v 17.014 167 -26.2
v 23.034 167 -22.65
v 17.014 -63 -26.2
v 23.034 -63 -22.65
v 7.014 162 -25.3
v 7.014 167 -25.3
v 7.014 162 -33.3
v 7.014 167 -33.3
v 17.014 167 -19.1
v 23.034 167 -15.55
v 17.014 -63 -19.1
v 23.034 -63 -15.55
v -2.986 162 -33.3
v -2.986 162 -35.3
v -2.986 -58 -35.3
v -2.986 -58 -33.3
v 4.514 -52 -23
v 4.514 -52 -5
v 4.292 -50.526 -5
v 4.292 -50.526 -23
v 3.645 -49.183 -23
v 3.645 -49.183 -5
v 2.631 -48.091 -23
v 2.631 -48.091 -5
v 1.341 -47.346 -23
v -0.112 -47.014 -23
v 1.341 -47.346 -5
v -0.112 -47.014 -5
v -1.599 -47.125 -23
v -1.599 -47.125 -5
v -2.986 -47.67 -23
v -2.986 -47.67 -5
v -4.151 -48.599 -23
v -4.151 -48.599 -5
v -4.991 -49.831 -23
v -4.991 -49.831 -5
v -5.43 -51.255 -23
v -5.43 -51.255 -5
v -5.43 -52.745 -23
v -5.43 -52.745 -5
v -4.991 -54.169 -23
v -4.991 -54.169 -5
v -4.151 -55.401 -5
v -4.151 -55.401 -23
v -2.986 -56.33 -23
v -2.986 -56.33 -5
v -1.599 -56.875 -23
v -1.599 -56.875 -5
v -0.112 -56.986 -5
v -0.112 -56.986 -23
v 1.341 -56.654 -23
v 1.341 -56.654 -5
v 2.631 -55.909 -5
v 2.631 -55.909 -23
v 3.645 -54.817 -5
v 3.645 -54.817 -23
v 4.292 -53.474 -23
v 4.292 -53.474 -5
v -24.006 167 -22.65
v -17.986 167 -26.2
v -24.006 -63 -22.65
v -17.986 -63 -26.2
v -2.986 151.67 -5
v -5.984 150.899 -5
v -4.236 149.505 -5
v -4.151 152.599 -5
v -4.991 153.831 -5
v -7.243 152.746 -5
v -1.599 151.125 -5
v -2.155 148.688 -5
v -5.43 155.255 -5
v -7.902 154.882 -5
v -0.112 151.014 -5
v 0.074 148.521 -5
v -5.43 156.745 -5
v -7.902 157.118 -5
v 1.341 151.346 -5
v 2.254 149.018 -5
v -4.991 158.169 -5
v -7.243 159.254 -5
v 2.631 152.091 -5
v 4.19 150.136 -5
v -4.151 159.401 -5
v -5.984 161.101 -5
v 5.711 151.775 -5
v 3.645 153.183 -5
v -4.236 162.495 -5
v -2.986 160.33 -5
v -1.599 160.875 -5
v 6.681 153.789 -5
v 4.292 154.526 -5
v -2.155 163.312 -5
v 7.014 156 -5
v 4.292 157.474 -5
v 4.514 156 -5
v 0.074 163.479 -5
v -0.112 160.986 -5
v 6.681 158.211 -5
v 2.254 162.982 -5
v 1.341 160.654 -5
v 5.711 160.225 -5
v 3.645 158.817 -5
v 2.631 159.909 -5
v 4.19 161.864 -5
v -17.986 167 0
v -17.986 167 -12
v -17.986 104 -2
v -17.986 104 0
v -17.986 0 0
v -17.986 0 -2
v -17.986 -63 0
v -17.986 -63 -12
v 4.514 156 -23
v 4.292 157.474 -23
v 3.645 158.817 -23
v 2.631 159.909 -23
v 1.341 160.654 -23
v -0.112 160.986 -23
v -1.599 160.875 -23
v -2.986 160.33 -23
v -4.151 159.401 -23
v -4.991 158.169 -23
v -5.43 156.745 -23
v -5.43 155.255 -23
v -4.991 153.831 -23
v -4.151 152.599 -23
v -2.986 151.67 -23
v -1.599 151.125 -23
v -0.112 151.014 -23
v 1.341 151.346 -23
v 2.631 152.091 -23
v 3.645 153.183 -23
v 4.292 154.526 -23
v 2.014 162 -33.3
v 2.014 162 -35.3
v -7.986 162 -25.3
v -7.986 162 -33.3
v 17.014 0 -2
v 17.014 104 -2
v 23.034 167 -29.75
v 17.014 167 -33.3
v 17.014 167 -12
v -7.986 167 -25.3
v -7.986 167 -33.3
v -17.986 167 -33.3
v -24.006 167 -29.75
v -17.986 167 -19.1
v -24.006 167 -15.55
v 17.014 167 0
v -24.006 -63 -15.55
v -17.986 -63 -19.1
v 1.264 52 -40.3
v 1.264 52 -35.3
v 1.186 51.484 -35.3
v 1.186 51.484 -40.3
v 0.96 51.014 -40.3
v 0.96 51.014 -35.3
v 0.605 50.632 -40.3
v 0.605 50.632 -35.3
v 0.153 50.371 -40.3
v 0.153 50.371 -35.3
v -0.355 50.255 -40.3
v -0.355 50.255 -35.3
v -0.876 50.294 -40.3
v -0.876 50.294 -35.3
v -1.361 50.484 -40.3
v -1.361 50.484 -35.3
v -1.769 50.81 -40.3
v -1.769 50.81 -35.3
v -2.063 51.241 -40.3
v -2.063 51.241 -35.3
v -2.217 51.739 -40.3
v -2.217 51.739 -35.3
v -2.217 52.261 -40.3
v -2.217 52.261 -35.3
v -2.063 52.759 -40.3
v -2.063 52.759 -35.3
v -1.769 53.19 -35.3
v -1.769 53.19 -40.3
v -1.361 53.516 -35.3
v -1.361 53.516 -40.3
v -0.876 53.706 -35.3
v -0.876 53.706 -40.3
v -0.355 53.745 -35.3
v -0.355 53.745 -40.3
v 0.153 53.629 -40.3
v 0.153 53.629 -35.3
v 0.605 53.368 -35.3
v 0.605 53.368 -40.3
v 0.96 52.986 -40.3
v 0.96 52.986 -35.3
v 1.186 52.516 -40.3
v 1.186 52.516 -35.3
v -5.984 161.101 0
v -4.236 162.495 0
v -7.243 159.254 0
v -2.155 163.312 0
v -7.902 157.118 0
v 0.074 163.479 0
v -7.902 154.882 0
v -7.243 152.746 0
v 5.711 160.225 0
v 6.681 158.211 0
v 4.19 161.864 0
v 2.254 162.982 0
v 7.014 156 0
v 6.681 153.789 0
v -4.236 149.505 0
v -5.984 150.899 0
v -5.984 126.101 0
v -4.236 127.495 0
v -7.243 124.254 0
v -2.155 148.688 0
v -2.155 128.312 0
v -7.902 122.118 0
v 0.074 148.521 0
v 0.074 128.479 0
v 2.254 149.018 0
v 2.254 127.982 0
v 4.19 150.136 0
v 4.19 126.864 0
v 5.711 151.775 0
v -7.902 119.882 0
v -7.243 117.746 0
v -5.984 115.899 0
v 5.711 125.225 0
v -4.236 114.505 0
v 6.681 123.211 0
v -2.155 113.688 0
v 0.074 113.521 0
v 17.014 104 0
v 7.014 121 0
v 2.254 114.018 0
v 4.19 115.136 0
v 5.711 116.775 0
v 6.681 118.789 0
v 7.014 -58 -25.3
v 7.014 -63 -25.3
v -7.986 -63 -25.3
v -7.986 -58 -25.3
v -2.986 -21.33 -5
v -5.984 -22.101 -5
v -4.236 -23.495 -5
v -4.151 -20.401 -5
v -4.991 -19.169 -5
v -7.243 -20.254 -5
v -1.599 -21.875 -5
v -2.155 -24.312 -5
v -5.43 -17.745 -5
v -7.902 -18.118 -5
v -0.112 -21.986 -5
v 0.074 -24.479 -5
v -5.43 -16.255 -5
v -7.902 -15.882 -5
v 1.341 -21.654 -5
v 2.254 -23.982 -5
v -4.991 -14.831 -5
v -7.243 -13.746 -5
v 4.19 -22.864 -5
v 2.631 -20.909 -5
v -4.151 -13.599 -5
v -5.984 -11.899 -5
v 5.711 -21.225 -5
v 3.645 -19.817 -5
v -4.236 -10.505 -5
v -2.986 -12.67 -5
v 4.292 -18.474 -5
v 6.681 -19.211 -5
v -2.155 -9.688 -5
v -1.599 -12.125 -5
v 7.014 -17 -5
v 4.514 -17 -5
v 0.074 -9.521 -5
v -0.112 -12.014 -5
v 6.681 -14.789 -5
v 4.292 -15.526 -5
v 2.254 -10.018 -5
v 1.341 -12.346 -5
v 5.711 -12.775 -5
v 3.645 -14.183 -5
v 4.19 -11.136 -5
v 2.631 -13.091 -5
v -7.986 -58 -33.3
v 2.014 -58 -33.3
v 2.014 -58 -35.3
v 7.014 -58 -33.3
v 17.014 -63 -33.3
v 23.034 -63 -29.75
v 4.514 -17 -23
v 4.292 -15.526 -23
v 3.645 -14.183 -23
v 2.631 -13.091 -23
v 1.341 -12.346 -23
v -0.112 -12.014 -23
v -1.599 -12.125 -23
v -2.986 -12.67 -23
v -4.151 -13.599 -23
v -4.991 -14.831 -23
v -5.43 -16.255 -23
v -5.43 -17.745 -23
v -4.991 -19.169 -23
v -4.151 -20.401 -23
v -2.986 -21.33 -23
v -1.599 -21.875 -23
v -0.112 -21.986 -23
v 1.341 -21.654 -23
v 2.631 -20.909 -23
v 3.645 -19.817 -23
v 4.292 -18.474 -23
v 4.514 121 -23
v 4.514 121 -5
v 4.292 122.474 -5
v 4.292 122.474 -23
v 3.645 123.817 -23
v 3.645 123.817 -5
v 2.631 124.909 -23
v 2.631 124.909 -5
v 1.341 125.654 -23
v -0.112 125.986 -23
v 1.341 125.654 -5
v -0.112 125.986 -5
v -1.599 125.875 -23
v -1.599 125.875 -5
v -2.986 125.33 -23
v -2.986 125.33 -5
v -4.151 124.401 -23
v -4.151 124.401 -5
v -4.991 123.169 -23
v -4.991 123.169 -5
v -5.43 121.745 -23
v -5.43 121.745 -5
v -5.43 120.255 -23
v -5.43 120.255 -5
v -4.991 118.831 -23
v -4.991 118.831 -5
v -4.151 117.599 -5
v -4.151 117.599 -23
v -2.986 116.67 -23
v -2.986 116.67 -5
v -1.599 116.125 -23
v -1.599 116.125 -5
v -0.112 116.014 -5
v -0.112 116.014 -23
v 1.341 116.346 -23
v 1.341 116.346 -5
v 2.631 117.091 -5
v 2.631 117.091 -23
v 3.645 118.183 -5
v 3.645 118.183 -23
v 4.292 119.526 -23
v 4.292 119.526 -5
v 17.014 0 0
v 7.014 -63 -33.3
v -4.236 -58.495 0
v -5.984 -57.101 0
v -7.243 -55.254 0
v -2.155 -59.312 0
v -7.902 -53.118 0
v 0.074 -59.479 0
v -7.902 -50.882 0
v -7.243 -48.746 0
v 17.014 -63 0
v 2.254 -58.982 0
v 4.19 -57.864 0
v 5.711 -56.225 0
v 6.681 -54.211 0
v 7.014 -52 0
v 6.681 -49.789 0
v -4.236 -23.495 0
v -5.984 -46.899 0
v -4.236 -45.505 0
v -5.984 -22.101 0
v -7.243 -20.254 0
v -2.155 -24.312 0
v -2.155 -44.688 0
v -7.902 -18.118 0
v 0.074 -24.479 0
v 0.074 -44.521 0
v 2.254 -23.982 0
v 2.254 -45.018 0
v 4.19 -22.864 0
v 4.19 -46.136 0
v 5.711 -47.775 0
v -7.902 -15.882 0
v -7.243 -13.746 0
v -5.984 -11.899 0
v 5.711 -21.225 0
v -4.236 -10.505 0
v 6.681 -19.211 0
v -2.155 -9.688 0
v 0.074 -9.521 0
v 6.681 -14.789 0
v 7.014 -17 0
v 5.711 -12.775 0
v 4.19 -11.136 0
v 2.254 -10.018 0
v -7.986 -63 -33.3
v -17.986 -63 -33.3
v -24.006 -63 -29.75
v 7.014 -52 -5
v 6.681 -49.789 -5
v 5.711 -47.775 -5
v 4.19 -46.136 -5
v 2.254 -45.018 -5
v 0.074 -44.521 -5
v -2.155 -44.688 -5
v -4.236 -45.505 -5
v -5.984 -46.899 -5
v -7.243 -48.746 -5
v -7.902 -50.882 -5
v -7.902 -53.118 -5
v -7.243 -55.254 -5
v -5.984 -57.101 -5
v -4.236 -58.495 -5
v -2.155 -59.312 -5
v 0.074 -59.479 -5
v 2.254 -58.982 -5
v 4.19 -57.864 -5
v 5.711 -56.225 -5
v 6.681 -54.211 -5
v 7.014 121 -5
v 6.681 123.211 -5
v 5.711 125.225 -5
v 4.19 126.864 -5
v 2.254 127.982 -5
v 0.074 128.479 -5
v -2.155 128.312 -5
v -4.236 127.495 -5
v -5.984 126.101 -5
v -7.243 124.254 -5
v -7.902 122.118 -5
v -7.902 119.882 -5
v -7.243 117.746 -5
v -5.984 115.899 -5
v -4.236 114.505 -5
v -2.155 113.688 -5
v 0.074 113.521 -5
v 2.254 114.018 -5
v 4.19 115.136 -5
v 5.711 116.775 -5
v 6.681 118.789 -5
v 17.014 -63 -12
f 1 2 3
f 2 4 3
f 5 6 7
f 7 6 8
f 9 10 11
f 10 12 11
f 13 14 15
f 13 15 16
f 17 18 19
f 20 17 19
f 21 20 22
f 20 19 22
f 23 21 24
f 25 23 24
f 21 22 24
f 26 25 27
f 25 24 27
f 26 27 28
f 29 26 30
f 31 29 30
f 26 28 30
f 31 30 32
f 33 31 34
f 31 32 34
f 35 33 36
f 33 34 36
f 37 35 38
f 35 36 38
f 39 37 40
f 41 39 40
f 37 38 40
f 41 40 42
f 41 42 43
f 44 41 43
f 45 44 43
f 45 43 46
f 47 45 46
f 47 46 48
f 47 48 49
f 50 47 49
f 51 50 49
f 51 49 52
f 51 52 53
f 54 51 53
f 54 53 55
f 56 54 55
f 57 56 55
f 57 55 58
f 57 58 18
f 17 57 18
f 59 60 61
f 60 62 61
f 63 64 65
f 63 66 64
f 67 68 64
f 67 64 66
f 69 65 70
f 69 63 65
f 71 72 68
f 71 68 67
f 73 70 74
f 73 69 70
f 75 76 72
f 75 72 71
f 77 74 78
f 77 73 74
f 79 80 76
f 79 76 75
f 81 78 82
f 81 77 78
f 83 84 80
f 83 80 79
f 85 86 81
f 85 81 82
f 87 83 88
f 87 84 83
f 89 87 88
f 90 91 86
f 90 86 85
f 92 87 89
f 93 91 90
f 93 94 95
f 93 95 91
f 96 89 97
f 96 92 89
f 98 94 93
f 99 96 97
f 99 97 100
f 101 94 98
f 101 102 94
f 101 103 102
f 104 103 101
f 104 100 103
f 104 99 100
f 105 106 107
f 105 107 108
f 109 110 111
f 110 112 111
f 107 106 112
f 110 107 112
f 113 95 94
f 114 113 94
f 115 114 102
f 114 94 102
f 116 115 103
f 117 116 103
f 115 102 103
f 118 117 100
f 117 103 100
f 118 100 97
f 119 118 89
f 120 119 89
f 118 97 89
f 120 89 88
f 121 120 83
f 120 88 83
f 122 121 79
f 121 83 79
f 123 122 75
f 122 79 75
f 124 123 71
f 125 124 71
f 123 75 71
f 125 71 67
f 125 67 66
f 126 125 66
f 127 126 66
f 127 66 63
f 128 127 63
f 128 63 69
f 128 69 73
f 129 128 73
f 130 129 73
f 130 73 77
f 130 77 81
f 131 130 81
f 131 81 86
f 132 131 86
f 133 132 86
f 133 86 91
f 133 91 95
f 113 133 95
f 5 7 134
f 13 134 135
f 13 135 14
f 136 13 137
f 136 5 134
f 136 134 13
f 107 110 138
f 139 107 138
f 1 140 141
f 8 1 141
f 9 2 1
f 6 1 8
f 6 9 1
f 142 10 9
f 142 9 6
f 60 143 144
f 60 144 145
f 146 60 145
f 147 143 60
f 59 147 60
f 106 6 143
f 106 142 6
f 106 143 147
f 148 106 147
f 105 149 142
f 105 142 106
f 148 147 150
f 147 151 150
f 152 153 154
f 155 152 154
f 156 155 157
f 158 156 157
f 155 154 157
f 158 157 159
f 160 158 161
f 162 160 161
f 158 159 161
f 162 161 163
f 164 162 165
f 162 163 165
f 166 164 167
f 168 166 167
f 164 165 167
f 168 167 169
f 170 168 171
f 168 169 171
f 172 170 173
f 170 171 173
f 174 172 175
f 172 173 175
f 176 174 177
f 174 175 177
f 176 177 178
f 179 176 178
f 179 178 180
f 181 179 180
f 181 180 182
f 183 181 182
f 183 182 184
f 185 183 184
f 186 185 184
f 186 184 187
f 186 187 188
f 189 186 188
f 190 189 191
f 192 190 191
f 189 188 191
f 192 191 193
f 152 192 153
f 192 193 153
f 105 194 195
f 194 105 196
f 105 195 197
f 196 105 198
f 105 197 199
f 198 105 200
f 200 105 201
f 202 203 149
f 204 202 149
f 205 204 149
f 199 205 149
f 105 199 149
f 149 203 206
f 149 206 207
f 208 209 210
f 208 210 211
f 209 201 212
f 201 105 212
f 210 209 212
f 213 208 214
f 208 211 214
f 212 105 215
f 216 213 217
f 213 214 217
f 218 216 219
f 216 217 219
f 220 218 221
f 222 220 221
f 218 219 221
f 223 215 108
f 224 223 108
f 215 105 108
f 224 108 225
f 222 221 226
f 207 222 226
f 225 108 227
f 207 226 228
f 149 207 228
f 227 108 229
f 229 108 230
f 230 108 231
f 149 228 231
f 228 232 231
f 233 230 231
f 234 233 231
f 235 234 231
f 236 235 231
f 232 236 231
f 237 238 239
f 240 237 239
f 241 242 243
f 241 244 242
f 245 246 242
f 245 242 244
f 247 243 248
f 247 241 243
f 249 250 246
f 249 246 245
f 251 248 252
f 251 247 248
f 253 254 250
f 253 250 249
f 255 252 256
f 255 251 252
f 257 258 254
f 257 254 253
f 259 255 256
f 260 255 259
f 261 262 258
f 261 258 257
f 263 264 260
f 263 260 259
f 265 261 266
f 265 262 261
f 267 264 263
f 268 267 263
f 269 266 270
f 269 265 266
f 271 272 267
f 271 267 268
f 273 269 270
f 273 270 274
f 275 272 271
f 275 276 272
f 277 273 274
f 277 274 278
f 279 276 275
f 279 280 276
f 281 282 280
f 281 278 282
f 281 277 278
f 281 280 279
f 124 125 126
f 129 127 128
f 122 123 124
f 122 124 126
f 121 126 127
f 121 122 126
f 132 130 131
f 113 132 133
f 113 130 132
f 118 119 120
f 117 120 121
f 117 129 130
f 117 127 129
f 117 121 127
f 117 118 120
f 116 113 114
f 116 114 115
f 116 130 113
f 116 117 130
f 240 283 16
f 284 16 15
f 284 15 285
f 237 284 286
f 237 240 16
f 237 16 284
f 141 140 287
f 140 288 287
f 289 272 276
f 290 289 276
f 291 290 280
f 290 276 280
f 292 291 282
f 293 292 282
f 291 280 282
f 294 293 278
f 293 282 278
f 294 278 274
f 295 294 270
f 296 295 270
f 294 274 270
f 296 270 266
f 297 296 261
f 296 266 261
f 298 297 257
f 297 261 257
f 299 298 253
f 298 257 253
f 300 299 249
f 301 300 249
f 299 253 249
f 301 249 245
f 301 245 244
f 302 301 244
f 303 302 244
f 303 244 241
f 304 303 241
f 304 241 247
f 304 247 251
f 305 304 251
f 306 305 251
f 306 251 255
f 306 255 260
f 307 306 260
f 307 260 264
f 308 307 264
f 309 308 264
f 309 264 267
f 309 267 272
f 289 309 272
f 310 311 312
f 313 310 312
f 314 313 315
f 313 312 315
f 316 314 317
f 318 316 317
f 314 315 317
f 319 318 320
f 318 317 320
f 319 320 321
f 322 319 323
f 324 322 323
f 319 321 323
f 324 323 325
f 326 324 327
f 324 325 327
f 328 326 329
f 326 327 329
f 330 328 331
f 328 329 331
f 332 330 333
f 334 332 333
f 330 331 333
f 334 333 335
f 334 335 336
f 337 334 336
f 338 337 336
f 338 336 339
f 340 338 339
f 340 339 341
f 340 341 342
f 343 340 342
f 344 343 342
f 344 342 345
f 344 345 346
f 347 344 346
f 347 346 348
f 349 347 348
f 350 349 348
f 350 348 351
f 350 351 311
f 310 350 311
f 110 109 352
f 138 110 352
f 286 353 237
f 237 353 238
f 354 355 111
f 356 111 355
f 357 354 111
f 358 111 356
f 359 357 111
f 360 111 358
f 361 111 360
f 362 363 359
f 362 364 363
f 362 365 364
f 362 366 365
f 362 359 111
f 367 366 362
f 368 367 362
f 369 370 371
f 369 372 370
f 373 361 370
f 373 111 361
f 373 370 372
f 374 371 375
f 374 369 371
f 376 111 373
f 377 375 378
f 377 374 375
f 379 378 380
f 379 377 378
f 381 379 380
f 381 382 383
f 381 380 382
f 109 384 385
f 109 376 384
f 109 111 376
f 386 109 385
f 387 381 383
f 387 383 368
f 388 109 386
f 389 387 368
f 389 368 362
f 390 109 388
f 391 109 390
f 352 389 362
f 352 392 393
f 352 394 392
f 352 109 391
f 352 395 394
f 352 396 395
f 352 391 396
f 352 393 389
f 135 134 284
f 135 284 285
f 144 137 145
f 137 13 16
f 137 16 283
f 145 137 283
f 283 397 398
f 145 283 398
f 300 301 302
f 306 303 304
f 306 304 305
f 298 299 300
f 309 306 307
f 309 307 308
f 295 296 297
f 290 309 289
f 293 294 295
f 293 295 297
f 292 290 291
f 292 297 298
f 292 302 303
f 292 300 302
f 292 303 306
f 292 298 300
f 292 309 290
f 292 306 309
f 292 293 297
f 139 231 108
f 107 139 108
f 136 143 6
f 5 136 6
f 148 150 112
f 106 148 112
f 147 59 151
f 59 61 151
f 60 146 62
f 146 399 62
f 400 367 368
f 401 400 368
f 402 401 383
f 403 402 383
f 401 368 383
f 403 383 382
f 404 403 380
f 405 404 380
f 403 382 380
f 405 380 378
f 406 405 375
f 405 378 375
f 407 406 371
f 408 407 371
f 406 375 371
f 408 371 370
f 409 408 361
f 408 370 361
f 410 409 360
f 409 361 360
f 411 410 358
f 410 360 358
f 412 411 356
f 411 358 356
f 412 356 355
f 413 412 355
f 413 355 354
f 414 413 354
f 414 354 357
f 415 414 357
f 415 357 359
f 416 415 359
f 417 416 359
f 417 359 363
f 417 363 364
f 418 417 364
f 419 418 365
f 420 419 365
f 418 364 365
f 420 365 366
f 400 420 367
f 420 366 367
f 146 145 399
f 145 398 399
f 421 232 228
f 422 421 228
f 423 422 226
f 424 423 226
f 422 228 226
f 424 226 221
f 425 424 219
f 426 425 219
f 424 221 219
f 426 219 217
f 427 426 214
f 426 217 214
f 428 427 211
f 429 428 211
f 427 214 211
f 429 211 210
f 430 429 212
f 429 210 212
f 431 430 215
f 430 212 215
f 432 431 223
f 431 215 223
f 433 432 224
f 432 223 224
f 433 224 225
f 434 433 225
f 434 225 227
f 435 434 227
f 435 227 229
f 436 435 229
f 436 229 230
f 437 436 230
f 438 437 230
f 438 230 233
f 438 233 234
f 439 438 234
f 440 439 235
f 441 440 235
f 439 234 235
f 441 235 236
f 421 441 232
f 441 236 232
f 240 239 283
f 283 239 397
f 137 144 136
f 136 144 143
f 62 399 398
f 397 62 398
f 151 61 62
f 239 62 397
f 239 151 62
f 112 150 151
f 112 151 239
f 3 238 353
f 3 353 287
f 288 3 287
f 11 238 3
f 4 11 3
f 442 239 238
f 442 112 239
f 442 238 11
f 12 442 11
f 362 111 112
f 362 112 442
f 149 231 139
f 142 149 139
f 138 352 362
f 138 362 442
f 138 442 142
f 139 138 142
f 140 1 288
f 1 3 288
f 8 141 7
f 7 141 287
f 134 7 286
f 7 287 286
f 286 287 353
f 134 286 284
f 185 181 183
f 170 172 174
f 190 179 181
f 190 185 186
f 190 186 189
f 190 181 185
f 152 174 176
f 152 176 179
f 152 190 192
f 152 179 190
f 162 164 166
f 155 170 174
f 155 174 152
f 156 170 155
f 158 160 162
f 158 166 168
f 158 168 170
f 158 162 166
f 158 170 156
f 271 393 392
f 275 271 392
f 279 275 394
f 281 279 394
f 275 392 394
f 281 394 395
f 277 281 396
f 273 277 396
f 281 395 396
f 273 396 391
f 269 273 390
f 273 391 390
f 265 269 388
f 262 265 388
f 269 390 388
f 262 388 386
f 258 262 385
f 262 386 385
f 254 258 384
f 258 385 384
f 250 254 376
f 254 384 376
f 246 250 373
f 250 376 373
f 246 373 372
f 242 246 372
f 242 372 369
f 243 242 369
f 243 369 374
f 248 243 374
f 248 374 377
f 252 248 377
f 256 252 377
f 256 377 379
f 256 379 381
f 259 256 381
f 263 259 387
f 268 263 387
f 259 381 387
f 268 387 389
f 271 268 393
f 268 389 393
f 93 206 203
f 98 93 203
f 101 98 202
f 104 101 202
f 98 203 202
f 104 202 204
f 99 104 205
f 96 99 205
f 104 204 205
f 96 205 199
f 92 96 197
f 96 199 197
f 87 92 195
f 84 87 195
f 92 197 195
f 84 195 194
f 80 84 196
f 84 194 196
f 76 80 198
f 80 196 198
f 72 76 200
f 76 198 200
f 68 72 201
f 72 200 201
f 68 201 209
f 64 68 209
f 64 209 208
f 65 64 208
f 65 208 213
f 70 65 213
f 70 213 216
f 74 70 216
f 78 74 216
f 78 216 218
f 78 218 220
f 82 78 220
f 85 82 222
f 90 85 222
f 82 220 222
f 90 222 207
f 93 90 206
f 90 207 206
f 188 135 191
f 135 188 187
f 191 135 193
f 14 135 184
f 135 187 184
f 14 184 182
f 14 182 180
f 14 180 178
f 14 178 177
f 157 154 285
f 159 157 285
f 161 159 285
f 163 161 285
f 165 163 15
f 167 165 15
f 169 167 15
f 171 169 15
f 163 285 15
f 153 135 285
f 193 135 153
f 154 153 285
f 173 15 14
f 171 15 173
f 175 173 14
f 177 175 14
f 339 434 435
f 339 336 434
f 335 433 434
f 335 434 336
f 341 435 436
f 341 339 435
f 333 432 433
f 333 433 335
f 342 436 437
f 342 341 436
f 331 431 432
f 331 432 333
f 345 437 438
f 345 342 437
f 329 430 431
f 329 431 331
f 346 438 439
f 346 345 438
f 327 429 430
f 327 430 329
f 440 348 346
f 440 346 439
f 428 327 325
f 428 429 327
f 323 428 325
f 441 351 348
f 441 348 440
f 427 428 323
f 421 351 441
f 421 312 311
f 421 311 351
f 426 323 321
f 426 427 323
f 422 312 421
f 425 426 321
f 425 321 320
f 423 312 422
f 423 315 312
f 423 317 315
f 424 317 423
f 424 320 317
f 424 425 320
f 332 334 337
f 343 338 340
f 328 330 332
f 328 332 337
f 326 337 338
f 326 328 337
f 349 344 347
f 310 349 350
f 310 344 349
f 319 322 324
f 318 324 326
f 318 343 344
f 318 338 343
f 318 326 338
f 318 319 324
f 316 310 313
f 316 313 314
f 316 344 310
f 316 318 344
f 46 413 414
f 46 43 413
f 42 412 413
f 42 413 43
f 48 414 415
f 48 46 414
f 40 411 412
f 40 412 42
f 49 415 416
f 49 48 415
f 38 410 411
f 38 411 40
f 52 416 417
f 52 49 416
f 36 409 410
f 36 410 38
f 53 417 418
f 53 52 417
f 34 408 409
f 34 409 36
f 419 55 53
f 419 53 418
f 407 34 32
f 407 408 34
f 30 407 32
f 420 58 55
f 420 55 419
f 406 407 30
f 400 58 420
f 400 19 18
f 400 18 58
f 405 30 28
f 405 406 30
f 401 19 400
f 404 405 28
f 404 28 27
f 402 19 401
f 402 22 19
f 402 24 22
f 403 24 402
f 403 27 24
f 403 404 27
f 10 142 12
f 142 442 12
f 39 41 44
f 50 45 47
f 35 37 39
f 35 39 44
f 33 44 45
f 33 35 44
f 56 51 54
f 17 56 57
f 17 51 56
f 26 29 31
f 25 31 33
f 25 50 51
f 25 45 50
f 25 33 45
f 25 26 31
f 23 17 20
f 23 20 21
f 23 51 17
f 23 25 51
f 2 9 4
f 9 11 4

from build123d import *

# Parameters (mm, degrees)
F0_W      = 35
F0_H      = 63
F1_DEPTH  = 35.3
F2_W      = 15
F2_H      = 2
F3_DEPTH  = 63.001
F4_DEPTH  = 63
F5_R      = 5
F6_DEPTH  = 23
F5_R_2    = 7.5
F7_DEPTH  = 5
F9_DEPTH  = 5
F11_DEPTH = 104
F13_DEPTH = 63
F14_R     = 5
F15_DEPTH = 23
F14_R_2   = 7.5
F16_DEPTH = 5
F17_R     = 1.75
F18_DEPTH = 5
F20_DEPTH = 5


with BuildPart() as f1:
    # F0 (on Top) → F1 (new body)
    with BuildSketch(Plane.XY):
        with Locations((-0.486111, -31.5)):
            Rectangle(F0_W, F0_H)
    extrude(amount=-F1_DEPTH)

    # F2 (on face) → F3 (cut, through all)
    with BuildSketch(Plane.XZ.offset(63)):
        with Locations((9.513889, -34.3)):
            Rectangle(F2_W, F2_H)
        with Locations((-10.486111, -34.3)):
            Rectangle(F2_W, F2_H)
    extrude(amount=-F3_DEPTH, mode=Mode.SUBTRACT)

    # F2 (on face) → F4 (join)
    with BuildSketch(Plane.XZ.offset(63)):
        Polygon((-17.986111, -19.1), (-17.986111, -12), (-24.006156, -15.55), align=None)
        Polygon((-17.986111, -26.2), (-17.986111, -19.1), (-24.006156, -22.65), align=None)
        Polygon((-17.986111, -33.3), (-17.986111, -26.2), (-24.006156, -29.75), align=None)
        Polygon((23.033934, -29.75), (17.013889, -26.2), (17.013889, -33.3), align=None)
        Polygon((23.033934, -15.55), (17.013889, -12), (17.013889, -19.1), align=None)
        Polygon((23.033934, -22.65), (17.013889, -19.1), (17.013889, -26.2), align=None)
    extrude(amount=-F4_DEPTH)

    # F5 (on face) → F6 (cut)
    with BuildSketch(Plane.XY):
        with Locations((-0.486111, -17)):
            Circle(F5_R)
        with Locations((-0.486111, -52)):
            Circle(F5_R)
    extrude(amount=-F6_DEPTH, mode=Mode.SUBTRACT)

    # F5 (on face) → F7 (cut)
    with BuildSketch(Plane.XY):
        with Locations((-0.486111, -17)):
            Circle(F5_R_2)
        with Locations((-0.486111, -17)):
            Circle(F5_R, mode=Mode.SUBTRACT)
        with Locations((-0.486111, -52)):
            Circle(F5_R_2)
        with Locations((-0.486111, -52)):
            Circle(F5_R, mode=Mode.SUBTRACT)
    extrude(amount=-F7_DEPTH, mode=Mode.SUBTRACT)

    # F8 (on face) → F9 (cut)
    with BuildSketch(Plane.XZ.offset(63)):
        Polygon((-0.486111, -25.3), (-7.986111, -25.3), (-7.986111, -35.504304), (7.013889, -35.504304), (7.013889, -25.3), align=None)
    extrude(amount=-F9_DEPTH, mode=Mode.SUBTRACT)

    # F10 (on face) → F11 (join)
    with BuildSketch(Plane(origin=(0, 0, 0), x_dir=(-1, 0, 0), z_dir=(0, 1, 0))):
        Polygon((17.986111, -2), (-17.013889, -2), (-17.013889, -12), (-23.033934, -15.55), (-17.013889, -19.1), (-23.033934, -22.65), (-17.013889, -26.2), (-23.033934, -29.75), (-17.013889, -33.3), (-2.013889, -33.3), (-2.013889, -35.3), (2.986111, -35.3), (2.986111, -33.3), (17.986111, -33.3), (24.006156, -29.75), (17.986111, -26.2), (24.006156, -22.65), (17.986111, -19.1), (24.006156, -15.55), (17.986111, -12), align=None)
    extrude(amount=F11_DEPTH)

    # F12 (on face) → F13 (join)
    with BuildSketch(Plane(origin=(0, 104, 0), x_dir=(-1, 0, 0), z_dir=(0, 1, 0))):
        Polygon((17.986111, 0), (-17.013889, 0), (-17.013889, -12), (-23.033934, -15.55), (-17.013889, -19.1), (-23.033934, -22.65), (-17.013889, -26.2), (-23.033934, -29.75), (-17.013889, -33.3), (-2.013889, -33.3), (-2.013889, -35.3), (2.986111, -35.3), (2.986111, -33.3), (17.986111, -33.3), (24.006156, -29.75), (17.986111, -26.2), (24.006156, -22.65), (17.986111, -19.1), (24.006156, -15.55), (17.986111, -12), align=None)
    extrude(amount=F13_DEPTH)

    # F14 (on face) → F15 (cut)
    with BuildSketch(Plane.XY):
        with Locations((-0.486111, 156)):
            Circle(F14_R)
        with Locations((-0.486111, 121)):
            Circle(F14_R)
    extrude(amount=-F15_DEPTH, mode=Mode.SUBTRACT)

    # F14 (on face) → F16 (cut)
    with BuildSketch(Plane.XY):
        with Locations((-0.486111, 156)):
            Circle(F14_R_2)
        with Locations((-0.486111, 156)):
            Circle(F14_R, mode=Mode.SUBTRACT)
        with Locations((-0.486111, 121)):
            Circle(F14_R_2)
        with Locations((-0.486111, 121)):
            Circle(F14_R, mode=Mode.SUBTRACT)
    extrude(amount=-F16_DEPTH, mode=Mode.SUBTRACT)

    # F17 (on face) → F18 (join)
    with BuildSketch(Plane(origin=(0, 0, -35.3), x_dir=(1, 0, 0), z_dir=(0, 0, -1))):
        with Locations((-0.486111, -52)):
            Circle(F17_R)
    extrude(amount=F18_DEPTH)

    # F19 (on face) → F20 (cut)
    with BuildSketch(Plane(origin=(0, 167, 0), x_dir=(-1, 0, 0), z_dir=(0, 1, 0))):
        Polygon((7.986111, -25.3), (0.486111, -25.3), (-7.013889, -25.3), (-7.013889, -35.3), (0.486111, -35.3), (7.986111, -35.3), align=None)
    extrude(amount=-F20_DEPTH, mode=Mode.SUBTRACT)


solid = f1.part
